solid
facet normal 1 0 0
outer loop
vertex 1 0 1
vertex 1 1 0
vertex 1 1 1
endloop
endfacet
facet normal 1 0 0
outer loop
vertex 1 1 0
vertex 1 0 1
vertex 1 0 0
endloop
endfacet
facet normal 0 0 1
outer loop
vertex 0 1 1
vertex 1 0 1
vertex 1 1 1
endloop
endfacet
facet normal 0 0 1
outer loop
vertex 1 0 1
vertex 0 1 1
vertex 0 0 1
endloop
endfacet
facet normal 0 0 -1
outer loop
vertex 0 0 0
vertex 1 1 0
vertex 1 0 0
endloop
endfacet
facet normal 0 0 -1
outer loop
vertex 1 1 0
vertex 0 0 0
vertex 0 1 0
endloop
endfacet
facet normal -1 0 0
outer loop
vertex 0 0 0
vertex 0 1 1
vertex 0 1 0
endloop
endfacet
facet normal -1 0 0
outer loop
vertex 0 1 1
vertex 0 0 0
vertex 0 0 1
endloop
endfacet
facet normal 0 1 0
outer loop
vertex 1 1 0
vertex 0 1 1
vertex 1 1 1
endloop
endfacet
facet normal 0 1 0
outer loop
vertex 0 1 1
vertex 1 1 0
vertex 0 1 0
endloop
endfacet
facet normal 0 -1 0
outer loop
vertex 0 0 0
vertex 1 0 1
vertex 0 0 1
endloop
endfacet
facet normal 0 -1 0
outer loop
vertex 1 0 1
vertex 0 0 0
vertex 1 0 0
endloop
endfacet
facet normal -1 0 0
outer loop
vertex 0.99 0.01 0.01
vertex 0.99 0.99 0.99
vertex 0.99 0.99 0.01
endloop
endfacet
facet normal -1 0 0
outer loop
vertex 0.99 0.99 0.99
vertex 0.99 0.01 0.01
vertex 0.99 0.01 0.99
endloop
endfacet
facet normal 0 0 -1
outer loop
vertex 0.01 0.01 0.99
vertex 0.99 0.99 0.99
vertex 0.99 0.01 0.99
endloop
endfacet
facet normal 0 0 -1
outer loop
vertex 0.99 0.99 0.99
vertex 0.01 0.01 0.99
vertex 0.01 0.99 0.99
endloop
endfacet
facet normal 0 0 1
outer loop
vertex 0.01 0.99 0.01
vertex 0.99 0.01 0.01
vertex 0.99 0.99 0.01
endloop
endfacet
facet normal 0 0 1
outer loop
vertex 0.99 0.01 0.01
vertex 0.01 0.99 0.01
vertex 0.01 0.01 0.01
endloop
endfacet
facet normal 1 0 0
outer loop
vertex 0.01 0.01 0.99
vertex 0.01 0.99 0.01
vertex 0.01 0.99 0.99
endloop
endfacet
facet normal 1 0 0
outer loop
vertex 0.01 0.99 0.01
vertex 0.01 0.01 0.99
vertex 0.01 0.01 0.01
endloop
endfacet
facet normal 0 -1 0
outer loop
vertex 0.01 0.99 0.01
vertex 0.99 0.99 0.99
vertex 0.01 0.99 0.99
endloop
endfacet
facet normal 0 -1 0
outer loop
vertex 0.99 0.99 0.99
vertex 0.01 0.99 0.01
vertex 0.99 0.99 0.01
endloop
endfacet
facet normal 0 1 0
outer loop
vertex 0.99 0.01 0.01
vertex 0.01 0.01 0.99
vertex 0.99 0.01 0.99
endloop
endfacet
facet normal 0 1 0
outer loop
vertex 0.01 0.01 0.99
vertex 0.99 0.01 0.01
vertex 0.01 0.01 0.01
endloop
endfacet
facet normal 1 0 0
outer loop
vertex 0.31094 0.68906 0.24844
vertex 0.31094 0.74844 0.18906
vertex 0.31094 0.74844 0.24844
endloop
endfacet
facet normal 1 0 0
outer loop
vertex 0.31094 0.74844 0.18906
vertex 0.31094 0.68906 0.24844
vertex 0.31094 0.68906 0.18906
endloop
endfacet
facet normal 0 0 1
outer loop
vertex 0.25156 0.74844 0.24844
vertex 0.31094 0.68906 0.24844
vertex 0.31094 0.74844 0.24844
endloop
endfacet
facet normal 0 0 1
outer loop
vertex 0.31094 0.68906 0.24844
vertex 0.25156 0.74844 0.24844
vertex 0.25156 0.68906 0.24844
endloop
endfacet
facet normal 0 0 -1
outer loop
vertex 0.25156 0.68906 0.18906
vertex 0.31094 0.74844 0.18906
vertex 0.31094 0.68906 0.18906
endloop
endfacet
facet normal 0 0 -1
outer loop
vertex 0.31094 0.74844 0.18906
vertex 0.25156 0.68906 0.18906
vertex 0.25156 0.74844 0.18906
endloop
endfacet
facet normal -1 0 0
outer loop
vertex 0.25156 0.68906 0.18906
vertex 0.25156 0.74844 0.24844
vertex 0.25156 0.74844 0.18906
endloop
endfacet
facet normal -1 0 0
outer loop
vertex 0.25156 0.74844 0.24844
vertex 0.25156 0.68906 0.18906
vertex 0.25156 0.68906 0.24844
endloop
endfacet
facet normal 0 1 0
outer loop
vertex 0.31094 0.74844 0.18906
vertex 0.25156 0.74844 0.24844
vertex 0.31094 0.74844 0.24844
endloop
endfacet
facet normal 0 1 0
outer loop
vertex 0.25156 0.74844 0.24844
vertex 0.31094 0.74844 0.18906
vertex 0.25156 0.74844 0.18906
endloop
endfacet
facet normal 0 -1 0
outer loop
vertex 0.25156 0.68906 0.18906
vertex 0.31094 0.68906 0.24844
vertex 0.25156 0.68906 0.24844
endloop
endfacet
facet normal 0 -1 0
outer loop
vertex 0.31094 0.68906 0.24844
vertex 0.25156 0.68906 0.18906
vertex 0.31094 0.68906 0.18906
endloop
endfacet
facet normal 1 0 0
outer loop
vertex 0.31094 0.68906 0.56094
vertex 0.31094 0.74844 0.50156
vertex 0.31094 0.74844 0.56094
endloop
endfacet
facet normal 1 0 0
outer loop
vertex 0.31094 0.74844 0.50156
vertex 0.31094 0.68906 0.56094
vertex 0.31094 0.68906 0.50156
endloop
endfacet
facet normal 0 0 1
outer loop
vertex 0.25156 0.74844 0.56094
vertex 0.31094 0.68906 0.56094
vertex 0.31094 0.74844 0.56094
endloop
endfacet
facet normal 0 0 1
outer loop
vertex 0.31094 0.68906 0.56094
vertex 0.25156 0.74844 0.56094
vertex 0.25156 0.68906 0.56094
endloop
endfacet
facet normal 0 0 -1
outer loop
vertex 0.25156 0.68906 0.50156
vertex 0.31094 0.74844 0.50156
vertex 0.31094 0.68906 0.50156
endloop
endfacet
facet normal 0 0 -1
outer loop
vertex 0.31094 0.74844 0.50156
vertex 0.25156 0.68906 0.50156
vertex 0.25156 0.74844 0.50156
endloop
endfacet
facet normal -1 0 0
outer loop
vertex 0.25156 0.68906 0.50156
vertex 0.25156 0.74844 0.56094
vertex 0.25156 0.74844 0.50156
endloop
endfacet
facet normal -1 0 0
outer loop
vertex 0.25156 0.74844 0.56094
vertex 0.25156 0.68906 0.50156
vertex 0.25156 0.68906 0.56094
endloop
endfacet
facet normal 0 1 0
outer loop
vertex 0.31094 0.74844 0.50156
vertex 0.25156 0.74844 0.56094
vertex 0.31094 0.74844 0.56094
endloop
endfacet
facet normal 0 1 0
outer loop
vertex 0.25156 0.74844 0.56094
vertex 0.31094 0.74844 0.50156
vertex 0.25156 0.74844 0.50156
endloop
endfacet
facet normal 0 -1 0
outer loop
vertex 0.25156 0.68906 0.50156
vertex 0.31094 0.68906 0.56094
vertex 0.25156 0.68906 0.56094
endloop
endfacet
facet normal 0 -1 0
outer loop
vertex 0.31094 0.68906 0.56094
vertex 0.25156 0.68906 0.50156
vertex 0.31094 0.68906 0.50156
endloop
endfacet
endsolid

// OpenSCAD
translate([0.28125, 0.71875, 0.21875]) color([0.6523783489196855, 0.683096383465323, 0.056707876426240755]) cube([0.059375, 0.059375, 0.059375], center=true);
translate([0.28125, 0.71875, 0.53125]) color([0.9202828421030393, 0.6224283212809713, 0.09884261478876644]) cube([0.059375, 0.059375, 0.059375], center=true);
color([0.3,0.3,0.3,0.3]) difference() { cube([1,1,1]); translate([0.01,0.01,0.01]) cube([0.98,0.98,0.98]); }
